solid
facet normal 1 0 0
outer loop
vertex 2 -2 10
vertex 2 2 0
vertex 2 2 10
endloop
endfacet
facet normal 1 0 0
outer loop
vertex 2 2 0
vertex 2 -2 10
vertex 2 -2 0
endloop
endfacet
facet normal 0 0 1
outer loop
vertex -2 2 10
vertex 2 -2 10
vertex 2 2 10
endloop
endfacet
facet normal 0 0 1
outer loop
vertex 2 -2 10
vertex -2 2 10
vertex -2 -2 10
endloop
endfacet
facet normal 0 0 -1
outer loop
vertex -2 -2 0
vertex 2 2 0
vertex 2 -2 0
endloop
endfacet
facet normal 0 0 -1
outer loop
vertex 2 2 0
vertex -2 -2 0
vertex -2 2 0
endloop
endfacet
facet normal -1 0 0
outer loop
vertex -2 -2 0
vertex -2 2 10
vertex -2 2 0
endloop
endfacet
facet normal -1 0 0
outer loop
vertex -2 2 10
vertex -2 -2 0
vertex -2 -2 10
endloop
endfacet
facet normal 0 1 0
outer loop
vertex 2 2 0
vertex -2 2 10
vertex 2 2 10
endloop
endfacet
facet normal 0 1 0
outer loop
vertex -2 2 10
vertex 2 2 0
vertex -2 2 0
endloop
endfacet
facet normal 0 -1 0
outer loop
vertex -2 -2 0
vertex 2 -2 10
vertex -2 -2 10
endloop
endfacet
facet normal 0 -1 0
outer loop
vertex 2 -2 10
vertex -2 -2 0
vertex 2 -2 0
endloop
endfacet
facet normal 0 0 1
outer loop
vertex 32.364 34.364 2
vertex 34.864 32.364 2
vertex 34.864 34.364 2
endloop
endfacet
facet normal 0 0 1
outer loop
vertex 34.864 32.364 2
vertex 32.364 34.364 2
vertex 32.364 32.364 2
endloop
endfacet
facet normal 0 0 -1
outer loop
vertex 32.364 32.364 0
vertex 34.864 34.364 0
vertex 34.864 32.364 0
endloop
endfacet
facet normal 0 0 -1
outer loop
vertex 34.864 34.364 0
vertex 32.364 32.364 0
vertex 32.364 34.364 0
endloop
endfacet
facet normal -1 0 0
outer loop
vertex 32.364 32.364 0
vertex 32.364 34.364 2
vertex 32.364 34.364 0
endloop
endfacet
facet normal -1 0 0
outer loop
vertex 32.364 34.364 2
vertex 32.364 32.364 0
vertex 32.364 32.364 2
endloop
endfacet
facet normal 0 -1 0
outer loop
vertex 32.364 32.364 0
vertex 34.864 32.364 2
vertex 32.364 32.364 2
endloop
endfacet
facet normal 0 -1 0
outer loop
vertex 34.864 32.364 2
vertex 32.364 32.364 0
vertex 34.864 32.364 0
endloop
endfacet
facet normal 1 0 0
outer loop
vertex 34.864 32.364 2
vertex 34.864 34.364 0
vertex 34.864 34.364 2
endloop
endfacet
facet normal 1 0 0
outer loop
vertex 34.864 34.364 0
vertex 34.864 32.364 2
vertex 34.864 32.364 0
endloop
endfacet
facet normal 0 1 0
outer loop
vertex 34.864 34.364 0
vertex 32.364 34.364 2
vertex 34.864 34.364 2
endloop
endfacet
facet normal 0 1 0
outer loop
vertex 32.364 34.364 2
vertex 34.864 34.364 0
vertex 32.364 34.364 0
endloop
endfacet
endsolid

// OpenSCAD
translate([0, 0, 5]) color([0,1,0,0.9]) cube([4, 4, 10], center=true);
translate([32.61429, 32.61429, 1]) color([1,0,0]) cube([0.5, 0.5, 2], center=true);
translate([33.11429, 32.61429, 1]) color([1,0,0]) cube([0.5, 0.5, 2], center=true);
translate([33.61429, 32.61429, 1]) color([1,0,0]) cube([0.5, 0.5, 2], center=true);
translate([34.11429, 32.61429, 1]) color([1,0,0]) cube([0.5, 0.5, 2], center=true);
translate([34.61429, 32.61429, 1]) color([1,0,0]) cube([0.5, 0.5, 2], center=true);
translate([32.61429, 33.11429, 1]) color([1,0,0]) cube([0.5, 0.5, 2], center=true);
translate([33.11429, 33.11429, 1]) color([1,0,0]) cube([0.5, 0.5, 2], center=true);
translate([33.61429, 33.11429, 1]) color([1,0,0]) cube([0.5, 0.5, 2], center=true);
translate([34.11429, 33.11429, 1]) color([1,0,0]) cube([0.5, 0.5, 2], center=true);
translate([34.61429, 33.11429, 1]) color([1,0,0]) cube([0.5, 0.5, 2], center=true);
translate([32.61429, 33.61429, 1]) color([1,0,0]) cube([0.5, 0.5, 2], center=true);
translate([33.11429, 33.61429, 1]) color([1,0,0]) cube([0.5, 0.5, 2], center=true);
translate([33.61429, 33.61429, 1]) color([1,0,0]) cube([0.5, 0.5, 2], center=true);
translate([34.11429, 33.61429, 1]) color([1,0,0]) cube([0.5, 0.5, 2], center=true);
translate([34.61429, 33.61429, 1]) color([1,0,0]) cube([0.5, 0.5, 2], center=true);
translate([32.61429, 34.11429, 1]) color([1,0,0]) cube([0.5, 0.5, 2], center=true);
translate([33.11429, 34.11429, 1]) color([1,0,0]) cube([0.5, 0.5, 2], center=true);
translate([33.61429, 34.11429, 1]) color([1,0,0]) cube([0.5, 0.5, 2], center=true);
translate([34.11429, 34.11429, 1]) color([1,0,0]) cube([0.5, 0.5, 2], center=true);
translate([34.61429, 34.11429, 1]) color([1,0,0]) cube([0.5, 0.5, 2], center=true);
